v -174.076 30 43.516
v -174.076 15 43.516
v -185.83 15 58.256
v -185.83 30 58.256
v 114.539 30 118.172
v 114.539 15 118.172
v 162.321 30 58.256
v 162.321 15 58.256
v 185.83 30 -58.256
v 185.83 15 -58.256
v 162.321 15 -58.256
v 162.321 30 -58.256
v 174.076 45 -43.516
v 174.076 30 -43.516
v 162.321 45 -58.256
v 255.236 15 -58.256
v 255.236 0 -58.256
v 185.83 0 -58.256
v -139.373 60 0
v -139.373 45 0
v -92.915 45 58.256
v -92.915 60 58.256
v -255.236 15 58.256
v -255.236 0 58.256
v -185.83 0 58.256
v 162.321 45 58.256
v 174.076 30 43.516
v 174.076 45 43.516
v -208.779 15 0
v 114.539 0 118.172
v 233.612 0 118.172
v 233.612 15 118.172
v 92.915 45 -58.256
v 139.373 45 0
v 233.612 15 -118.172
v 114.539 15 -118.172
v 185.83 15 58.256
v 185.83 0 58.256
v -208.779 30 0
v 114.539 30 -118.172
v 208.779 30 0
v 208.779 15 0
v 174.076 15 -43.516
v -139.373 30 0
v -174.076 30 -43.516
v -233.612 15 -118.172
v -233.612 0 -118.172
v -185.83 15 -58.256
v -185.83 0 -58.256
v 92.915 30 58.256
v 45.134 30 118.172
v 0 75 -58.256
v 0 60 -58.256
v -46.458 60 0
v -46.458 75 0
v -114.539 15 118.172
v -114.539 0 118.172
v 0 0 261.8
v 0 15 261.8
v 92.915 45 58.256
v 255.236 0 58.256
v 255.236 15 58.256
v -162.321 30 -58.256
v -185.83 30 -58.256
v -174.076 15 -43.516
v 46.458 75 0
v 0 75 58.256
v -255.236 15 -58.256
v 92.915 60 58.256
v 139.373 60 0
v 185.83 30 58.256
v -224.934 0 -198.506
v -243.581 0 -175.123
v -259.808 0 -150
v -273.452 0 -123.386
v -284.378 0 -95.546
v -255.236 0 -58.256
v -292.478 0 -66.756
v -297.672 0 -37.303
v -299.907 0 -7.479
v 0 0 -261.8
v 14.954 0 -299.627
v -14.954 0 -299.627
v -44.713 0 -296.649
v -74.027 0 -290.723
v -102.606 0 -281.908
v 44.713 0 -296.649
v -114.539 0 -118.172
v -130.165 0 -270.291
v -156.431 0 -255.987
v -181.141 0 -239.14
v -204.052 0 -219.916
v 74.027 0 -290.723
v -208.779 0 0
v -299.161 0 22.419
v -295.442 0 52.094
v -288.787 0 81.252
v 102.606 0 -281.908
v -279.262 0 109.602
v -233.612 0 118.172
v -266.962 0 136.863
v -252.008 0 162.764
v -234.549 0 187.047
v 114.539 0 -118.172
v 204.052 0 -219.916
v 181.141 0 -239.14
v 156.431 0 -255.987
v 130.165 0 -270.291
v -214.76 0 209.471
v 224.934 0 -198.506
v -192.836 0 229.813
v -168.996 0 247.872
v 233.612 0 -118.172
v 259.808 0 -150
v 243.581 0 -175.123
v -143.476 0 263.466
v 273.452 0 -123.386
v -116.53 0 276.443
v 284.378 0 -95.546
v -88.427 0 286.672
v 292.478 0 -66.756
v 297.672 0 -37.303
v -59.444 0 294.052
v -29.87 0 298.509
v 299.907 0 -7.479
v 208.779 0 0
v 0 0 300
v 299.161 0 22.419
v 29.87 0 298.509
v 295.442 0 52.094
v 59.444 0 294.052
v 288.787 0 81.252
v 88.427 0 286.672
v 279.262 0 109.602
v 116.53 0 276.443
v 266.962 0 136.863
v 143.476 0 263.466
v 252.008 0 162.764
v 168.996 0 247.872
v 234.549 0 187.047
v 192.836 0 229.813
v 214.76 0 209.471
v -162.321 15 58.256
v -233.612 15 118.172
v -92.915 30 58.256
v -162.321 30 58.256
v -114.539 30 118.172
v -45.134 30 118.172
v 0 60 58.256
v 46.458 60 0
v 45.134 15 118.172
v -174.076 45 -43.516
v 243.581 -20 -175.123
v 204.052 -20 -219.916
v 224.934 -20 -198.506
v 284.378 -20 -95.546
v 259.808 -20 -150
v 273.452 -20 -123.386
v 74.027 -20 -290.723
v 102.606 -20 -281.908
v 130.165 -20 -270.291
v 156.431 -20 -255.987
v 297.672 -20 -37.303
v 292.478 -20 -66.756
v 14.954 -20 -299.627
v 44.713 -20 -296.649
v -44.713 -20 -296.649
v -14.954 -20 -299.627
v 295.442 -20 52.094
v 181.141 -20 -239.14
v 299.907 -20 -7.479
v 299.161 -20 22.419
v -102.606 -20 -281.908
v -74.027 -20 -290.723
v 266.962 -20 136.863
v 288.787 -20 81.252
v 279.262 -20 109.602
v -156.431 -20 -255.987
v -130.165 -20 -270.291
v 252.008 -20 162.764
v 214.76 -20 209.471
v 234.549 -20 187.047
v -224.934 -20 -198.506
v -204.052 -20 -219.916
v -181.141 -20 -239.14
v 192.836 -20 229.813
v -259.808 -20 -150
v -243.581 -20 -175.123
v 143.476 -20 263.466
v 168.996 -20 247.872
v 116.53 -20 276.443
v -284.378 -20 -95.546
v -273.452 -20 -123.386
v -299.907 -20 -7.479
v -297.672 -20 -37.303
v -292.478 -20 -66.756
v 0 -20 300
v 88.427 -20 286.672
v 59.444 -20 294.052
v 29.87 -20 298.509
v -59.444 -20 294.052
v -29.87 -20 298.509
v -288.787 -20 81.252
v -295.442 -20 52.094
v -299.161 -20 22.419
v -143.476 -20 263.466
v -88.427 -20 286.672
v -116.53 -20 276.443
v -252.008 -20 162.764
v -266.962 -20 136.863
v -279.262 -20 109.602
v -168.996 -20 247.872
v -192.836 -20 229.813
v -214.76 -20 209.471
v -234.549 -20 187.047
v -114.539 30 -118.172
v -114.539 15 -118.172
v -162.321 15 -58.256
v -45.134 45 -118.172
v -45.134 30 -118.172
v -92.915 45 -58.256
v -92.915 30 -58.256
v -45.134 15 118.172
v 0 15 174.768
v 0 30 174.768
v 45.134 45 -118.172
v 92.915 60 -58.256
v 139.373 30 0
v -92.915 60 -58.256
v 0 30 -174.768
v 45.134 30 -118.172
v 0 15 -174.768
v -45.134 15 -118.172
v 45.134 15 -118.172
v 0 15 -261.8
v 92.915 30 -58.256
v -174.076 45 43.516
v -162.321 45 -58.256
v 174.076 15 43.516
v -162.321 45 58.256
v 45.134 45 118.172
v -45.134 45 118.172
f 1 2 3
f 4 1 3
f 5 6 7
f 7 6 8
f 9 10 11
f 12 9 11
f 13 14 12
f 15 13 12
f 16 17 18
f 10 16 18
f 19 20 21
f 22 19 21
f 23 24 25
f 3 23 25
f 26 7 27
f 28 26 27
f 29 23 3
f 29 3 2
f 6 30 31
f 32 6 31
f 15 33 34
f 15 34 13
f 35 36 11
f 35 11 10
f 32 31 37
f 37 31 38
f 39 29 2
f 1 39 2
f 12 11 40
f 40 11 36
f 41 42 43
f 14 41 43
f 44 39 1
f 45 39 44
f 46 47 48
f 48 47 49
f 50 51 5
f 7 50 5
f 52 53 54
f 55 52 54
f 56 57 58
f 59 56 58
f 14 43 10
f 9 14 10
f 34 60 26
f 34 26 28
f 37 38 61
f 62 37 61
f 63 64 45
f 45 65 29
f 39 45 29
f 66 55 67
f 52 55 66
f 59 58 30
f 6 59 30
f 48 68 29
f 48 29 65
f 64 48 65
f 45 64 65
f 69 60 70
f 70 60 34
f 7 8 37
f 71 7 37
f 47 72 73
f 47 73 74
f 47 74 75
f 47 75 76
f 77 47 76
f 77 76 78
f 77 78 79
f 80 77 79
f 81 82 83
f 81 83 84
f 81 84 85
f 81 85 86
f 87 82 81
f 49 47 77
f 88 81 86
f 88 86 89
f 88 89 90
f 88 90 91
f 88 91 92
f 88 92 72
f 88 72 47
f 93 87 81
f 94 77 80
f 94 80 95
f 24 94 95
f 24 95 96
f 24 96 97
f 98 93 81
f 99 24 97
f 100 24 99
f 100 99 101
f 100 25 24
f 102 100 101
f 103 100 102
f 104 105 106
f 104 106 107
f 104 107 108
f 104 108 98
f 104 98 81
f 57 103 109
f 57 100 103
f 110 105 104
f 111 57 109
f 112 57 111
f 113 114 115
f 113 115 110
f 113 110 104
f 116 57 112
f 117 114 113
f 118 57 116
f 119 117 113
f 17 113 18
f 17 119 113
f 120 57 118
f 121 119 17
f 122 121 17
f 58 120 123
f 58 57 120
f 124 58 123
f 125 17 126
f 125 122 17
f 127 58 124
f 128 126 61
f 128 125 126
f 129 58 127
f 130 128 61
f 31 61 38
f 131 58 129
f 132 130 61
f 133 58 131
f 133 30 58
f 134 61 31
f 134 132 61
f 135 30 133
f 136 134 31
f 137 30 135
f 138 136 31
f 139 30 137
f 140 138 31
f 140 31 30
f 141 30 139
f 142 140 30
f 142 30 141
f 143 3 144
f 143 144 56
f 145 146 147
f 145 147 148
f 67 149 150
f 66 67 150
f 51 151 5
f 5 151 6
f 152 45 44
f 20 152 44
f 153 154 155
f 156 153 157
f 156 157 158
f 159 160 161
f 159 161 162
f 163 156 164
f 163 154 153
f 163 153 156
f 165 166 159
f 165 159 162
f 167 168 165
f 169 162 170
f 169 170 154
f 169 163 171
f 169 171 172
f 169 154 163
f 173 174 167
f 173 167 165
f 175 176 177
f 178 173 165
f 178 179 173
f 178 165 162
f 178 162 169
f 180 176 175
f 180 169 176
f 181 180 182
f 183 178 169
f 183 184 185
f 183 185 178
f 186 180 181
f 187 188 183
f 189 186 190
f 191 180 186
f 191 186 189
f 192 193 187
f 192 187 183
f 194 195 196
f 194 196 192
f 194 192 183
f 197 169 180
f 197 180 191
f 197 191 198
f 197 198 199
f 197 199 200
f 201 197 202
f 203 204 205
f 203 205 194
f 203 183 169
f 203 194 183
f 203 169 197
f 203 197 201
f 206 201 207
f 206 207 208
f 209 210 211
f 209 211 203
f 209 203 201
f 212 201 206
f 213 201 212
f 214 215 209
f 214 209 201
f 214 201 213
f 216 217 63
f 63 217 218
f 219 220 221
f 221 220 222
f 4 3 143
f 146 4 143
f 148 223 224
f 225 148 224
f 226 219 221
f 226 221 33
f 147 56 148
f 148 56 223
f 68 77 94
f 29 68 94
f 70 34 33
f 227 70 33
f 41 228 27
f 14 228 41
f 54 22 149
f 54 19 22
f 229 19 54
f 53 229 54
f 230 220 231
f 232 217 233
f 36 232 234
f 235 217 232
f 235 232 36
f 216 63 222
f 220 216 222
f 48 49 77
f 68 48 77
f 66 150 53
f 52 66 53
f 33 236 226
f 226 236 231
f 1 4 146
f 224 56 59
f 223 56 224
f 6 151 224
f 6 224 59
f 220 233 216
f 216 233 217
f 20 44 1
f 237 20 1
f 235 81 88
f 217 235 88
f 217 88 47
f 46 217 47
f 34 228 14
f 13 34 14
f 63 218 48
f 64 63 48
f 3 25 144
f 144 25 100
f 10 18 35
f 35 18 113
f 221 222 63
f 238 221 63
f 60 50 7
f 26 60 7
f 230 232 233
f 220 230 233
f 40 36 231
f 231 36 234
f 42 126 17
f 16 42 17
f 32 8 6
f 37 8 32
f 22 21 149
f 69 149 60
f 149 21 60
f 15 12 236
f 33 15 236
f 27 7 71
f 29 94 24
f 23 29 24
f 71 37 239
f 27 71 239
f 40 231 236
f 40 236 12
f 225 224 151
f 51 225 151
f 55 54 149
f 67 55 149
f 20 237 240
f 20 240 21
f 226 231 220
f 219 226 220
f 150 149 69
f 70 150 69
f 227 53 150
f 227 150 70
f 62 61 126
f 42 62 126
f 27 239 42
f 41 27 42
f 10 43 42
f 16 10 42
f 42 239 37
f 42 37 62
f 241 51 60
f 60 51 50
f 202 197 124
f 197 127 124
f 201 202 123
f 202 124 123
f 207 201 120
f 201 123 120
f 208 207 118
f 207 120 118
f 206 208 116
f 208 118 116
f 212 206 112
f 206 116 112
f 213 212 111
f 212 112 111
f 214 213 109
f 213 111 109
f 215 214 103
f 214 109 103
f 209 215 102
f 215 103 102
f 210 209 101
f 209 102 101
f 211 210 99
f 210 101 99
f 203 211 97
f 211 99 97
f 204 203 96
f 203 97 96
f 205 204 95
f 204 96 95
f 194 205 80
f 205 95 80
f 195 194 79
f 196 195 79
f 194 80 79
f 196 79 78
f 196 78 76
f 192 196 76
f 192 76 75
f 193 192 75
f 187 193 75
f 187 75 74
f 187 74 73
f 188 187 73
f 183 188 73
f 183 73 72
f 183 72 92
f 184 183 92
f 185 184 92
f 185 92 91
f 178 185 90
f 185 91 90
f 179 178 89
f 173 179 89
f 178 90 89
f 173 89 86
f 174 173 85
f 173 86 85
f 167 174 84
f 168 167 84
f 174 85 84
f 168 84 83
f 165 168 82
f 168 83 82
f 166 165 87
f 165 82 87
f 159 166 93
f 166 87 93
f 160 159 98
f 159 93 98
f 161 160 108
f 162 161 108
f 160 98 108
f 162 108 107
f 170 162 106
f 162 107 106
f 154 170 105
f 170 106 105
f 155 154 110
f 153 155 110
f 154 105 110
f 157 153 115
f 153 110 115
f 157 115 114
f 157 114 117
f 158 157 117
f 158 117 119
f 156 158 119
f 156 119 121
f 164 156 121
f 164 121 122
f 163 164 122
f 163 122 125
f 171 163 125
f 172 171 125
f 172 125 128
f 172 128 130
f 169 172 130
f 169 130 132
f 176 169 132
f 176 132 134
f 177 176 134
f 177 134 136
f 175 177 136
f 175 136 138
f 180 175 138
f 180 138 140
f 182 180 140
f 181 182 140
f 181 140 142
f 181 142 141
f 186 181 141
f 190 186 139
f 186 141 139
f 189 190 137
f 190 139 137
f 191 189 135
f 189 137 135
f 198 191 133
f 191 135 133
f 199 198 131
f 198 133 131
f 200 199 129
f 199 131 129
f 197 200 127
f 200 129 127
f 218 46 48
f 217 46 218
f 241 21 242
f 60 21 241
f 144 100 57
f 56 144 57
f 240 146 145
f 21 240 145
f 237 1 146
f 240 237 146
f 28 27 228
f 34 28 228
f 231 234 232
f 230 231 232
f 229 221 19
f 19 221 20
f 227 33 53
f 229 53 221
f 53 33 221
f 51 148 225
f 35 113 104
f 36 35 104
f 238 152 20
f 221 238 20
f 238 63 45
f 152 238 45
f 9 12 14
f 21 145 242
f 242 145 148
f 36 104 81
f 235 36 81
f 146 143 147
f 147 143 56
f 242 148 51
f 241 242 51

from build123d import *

# Parameters (mm, degrees)
SKETCH1_R            = 300
BOSS_EXTRUDE1_DEPTH  = 10
SKETCH2_R            = 300
BOSS_EXTRUDE2_DEPTH  = 10
BOSS_EXTRUDE4_DEPTH  = 15
BOSS_EXTRUDE5_DEPTH  = 15
BOSS_EXTRUDE11_DEPTH = 15
BOSS_EXTRUDE12_DEPTH = 15
BOSS_EXTRUDE13_DEPTH = 15


with BuildPart() as part:
    # Sketch1 → Boss-Extrude1 (new body)
    with BuildSketch(Plane(origin=(0, 0, 0), x_dir=(1, 0, 0), z_dir=(0, 1, 0))):
        with Locations(Location((0, 0, 0), (0, 0, 270))):
            Circle(SKETCH1_R)
    extrude(amount=-BOSS_EXTRUDE1_DEPTH)

    # Sketch2 → Boss-Extrude2 (add)
    with BuildSketch(Plane.XZ.offset(10)):
        with Locations(Location((0, 0, 0), (0, 0, 90))):
            Circle(SKETCH2_R)
    extrude(amount=BOSS_EXTRUDE2_DEPTH)

    # Sketch3 → Boss-Extrude4 (add)
    with BuildSketch(Plane(origin=(0, 0, 0), x_dir=(1, 0, 0), z_dir=(0, 1, 0))):
        Polygon((-45.133571821, -118.172232568), (-114.539322431, -118.172232568), (0, -261.8), (0, -174.767941529), align=None)
        Polygon((0, -174.767941529), (0, -261.8), (114.539322431, -118.172232568), (45.133571821, -118.172232568), align=None)
        Polygon((233.611993377, -118.172232568), (185.830376799, -58.25598051), (162.32093901, -58.25598051), (114.539322431, -118.172232568), align=None)
        Polygon((255.236127409, -58.25598051), (208.778533209, 0), (174.075657904, -43.516029235), (185.830376799, -58.25598051), align=None)
        Polygon((255.236127409, 58.25598051), (185.830376799, 58.25598051), (174.075657904, 43.516029235), (208.778533209, 0), align=None)
        Polygon((233.611993377, 118.172232568), (114.539322431, 118.172232568), (162.32093901, 58.25598051), (185.830376799, 58.25598051), align=None)
        Polygon((114.539322431, 118.172232568), (0, 261.8), (0, 174.767941529), (45.133571821, 118.172232568), align=None)
        Polygon((0, 174.767941529), (0, 261.8), (-114.539322431, 118.172232568), (-45.133571821, 118.172232568), align=None)
        Polygon((-162.32093901, 58.25598051), (-114.539322431, 118.172232568), (-233.611993377, 118.172232568), (-185.830376799, 58.25598051), align=None)
        Polygon((-174.075657904, 43.516029235), (-185.830376799, 58.25598051), (-255.236127409, 58.25598051), (-208.778533209, 0), align=None)
        Polygon((-174.075657904, -43.516029235), (-208.778533209, 0), (-255.236127409, -58.25598051), (-185.830376799, -58.25598051), align=None)
        Polygon((-162.32093901, -58.25598051), (-185.830376799, -58.25598051), (-233.611993377, -118.172232568), (-114.539322431, -118.172232568), align=None)
        Polygon((-174.075657904, 43.516029235), (-162.32093901, 58.25598051), (-185.830376799, 58.25598051), align=None)
        Polygon((-139.372782599, 0), (-174.075657904, 43.516029235), (-208.778533209, 0), (-174.075657904, -43.516029235), align=None)
        Polygon((-162.32093901, -58.25598051), (-174.075657904, -43.516029235), (-185.830376799, -58.25598051), align=None)
        Polygon((-92.9151884, -58.25598051), (-139.372782599, 0), (-174.075657904, -43.516029235), (-162.32093901, -58.25598051), align=None)
        Polygon((-45.133571821, -118.172232568), (-92.9151884, -58.25598051), (-162.32093901, -58.25598051), (-114.539322431, -118.172232568), align=None)
        Polygon((0, -174.767941529), (0, -118.172232568), (-45.133571821, -118.172232568), align=None)
        Polygon((45.133571821, -118.172232568), (0, -118.172232568), (0, -174.767941529), align=None)
        Polygon((162.32093901, -58.25598051), (92.9151884, -58.25598051), (45.133571821, -118.172232568), (114.539322431, -118.172232568), align=None)
        Polygon((174.075657904, -43.516029235), (139.372782599, 0), (92.9151884, -58.25598051), (162.32093901, -58.25598051), align=None)
        Polygon((185.830376799, -58.25598051), (174.075657904, -43.516029235), (162.32093901, -58.25598051), align=None)
        Polygon((208.778533209, 0), (174.075657904, 43.516029235), (139.372782599, 0), (174.075657904, -43.516029235), align=None)
        Polygon((174.075657904, 43.516029235), (162.32093901, 58.25598051), (92.9151884, 58.25598051), (139.372782599, 0), align=None)
        Polygon((185.830376799, 58.25598051), (162.32093901, 58.25598051), (174.075657904, 43.516029235), align=None)
        Polygon((162.32093901, 58.25598051), (114.539322431, 118.172232568), (45.133571821, 118.172232568), (92.9151884, 58.25598051), align=None)
        Polygon((45.133571821, 118.172232568), (0, 174.767941529), (0, 118.172232568), align=None)
        Polygon((0, 118.172232568), (0, 174.767941529), (-45.133571821, 118.172232568), align=None)
        Polygon((-45.133571821, 118.172232568), (-114.539322431, 118.172232568), (-162.32093901, 58.25598051), (-92.9151884, 58.25598051), align=None)
        Polygon((-92.9151884, 58.25598051), (-162.32093901, 58.25598051), (-174.075657904, 43.516029235), (-139.372782599, 0), align=None)
        Polygon((-46.4575942, 0), (-92.9151884, 58.25598051), (-139.372782599, 0), (-92.9151884, -58.25598051), align=None)
        Polygon((-46.4575942, 0), (0, 58.25598051), (-92.9151884, 58.25598051), align=None)
        Polygon((0, 58.25598051), (0, 118.172232568), (-45.133571821, 118.172232568), (-92.9151884, 58.25598051), align=None)
        Polygon((45.133571821, 118.172232568), (0, 118.172232568), (0, 58.25598051), (92.9151884, 58.25598051), align=None)
        Polygon((92.9151884, 58.25598051), (0, 58.25598051), (46.4575942, 0), align=None)
        Polygon((139.372782599, 0), (92.9151884, 58.25598051), (46.4575942, 0), (92.9151884, -58.25598051), align=None)
        Polygon((92.9151884, -58.25598051), (46.4575942, 0), (0, -58.25598051), align=None)
        Polygon((46.4575942, 0), (0, 0), (0, -58.25598051), align=None)
        Polygon((46.4575942, 0), (0, 58.25598051), (0, 0), align=None)
        Polygon((0, 0), (0, 58.25598051), (-46.4575942, 0), align=None)
        Polygon((0, -58.25598051), (0, 0), (-46.4575942, 0), align=None)
        Polygon((0, -58.25598051), (-46.4575942, 0), (-92.9151884, -58.25598051), align=None)
        Polygon((0, -118.172232568), (0, -58.25598051), (-92.9151884, -58.25598051), (-45.133571821, -118.172232568), align=None)
        Polygon((92.9151884, -58.25598051), (0, -58.25598051), (0, -118.172232568), (45.133571821, -118.172232568), align=None)
    extrude(amount=BOSS_EXTRUDE4_DEPTH)

    # Sketch4 → Boss-Extrude5 (add)
    with BuildSketch(Plane(origin=(0, 15, 0), x_dir=(1, 0, 0), z_dir=(0, 1, 0))):
        Polygon((45.133571821, 118.172232568), (0, 174.767941529), (-45.133571821, 118.172232568), (-114.539322431, 118.172232568), (-162.32093901, 58.25598051), (-185.830376799, 58.25598051), (-174.075657904, 43.516029235), (-208.778533209, 0), (-174.075657904, -43.516029235), (-185.830376799, -58.25598051), (-162.32093901, -58.25598051), (-114.539322431, -118.172232568), (-45.133571821, -118.172232568), (0, -174.767941529), (45.133571821, -118.172232568), (114.539322431, -118.172232568), (162.32093901, -58.25598051), (185.830376799, -58.25598051), (174.075657904, -43.516029235), (208.778533209, 0), (174.075657904, 43.516029235), (185.830376799, 58.25598051), (162.32093901, 58.25598051), (114.539322431, 118.172232568), align=None)
    extrude(amount=BOSS_EXTRUDE5_DEPTH)

    # Sketch6 → Boss-Extrude11 (add)
    with BuildSketch(Plane(origin=(0, 30, 0), x_dir=(1, 0, 0), z_dir=(0, 1, 0))):
        Polygon((0, -118.172232568), (0, -58.25598051), (-92.9151884, -58.25598051), (-45.133571821, -118.172232568), align=None)
        Polygon((92.9151884, -58.25598051), (0, -58.25598051), (0, -118.172232568), (45.133571821, -118.172232568), align=None)
        Polygon((174.075657904, -43.516029235), (139.372782599, 0), (92.9151884, -58.25598051), (162.32093901, -58.25598051), align=None)
        Polygon((139.372782599, 0), (92.9151884, 58.25598051), (46.4575942, 0), (92.9151884, -58.25598051), align=None)
        Polygon((174.075657904, 43.516029235), (162.32093901, 58.25598051), (92.9151884, 58.25598051), (139.372782599, 0), align=None)
        Polygon((45.133571821, 118.172232568), (0, 118.172232568), (0, 58.25598051), (92.9151884, 58.25598051), align=None)
        Polygon((0, 58.25598051), (0, 118.172232568), (-45.133571821, 118.172232568), (-92.9151884, 58.25598051), align=None)
        Polygon((-46.4575942, 0), (-92.9151884, 58.25598051), (-139.372782599, 0), (-92.9151884, -58.25598051), align=None)
        Polygon((-92.9151884, 58.25598051), (-162.32093901, 58.25598051), (-174.075657904, 43.516029235), (-139.372782599, 0), align=None)
        Polygon((-92.9151884, -58.25598051), (-139.372782599, 0), (-174.075657904, -43.516029235), (-162.32093901, -58.25598051), align=None)
        Polygon((0, -58.25598051), (-46.4575942, 0), (-92.9151884, -58.25598051), align=None)
        Polygon((92.9151884, -58.25598051), (46.4575942, 0), (0, -58.25598051), align=None)
        Polygon((46.4575942, 0), (0, 0), (0, -58.25598051), align=None)
        Polygon((0, -58.25598051), (0, 0), (-46.4575942, 0), align=None)
        Polygon((0, 0), (0, 58.25598051), (-46.4575942, 0), align=None)
        Polygon((46.4575942, 0), (0, 58.25598051), (0, 0), align=None)
        Polygon((92.9151884, 58.25598051), (0, 58.25598051), (46.4575942, 0), align=None)
        Polygon((-46.4575942, 0), (0, 58.25598051), (-92.9151884, 58.25598051), align=None)
    extrude(amount=BOSS_EXTRUDE11_DEPTH)

    # Sketch10 → Boss-Extrude12 (add)
    with BuildSketch(Plane(origin=(0, 45, 0), x_dir=(1, 0, 0), z_dir=(0, 1, 0))):
        Polygon((-46.4575942, 0), (-92.9151884, 58.25598051), (-139.372782599, 0), (-92.9151884, -58.25598051), align=None)
        Polygon((-46.4575942, 0), (0, 58.25598051), (-92.9151884, 58.25598051), align=None)
        Polygon((92.9151884, 58.25598051), (0, 58.25598051), (46.4575942, 0), align=None)
        Polygon((139.372782599, 0), (92.9151884, 58.25598051), (46.4575942, 0), (92.9151884, -58.25598051), align=None)
        Polygon((92.9151884, -58.25598051), (46.4575942, 0), (0, -58.25598051), align=None)
        Polygon((46.4575942, 0), (0, 58.25598051), (0, 0), align=None)
        Polygon((0, 0), (0, 58.25598051), (-46.4575942, 0), align=None)
        Polygon((0, -58.25598051), (0, 0), (-46.4575942, 0), align=None)
        Polygon((46.4575942, 0), (0, 0), (0, -58.25598051), align=None)
        Polygon((0, -58.25598051), (-46.4575942, 0), (-92.9151884, -58.25598051), align=None)
    extrude(amount=BOSS_EXTRUDE12_DEPTH)

    # Sketch11 → Boss-Extrude13 (add)
    with BuildSketch(Plane(origin=(0, 60, 0), x_dir=(1, 0, 0), z_dir=(0, 1, 0))):
        Polygon((0, 0), (0, 58.25598051), (-46.4575942, 0), align=None)
        Polygon((46.4575942, 0), (0, 58.25598051), (0, 0), align=None)
        Polygon((46.4575942, 0), (0, 0), (0, -58.25598051), align=None)
        Polygon((0, -58.25598051), (0, 0), (-46.4575942, 0), align=None)
    extrude(amount=BOSS_EXTRUDE13_DEPTH)


solid = part.part
